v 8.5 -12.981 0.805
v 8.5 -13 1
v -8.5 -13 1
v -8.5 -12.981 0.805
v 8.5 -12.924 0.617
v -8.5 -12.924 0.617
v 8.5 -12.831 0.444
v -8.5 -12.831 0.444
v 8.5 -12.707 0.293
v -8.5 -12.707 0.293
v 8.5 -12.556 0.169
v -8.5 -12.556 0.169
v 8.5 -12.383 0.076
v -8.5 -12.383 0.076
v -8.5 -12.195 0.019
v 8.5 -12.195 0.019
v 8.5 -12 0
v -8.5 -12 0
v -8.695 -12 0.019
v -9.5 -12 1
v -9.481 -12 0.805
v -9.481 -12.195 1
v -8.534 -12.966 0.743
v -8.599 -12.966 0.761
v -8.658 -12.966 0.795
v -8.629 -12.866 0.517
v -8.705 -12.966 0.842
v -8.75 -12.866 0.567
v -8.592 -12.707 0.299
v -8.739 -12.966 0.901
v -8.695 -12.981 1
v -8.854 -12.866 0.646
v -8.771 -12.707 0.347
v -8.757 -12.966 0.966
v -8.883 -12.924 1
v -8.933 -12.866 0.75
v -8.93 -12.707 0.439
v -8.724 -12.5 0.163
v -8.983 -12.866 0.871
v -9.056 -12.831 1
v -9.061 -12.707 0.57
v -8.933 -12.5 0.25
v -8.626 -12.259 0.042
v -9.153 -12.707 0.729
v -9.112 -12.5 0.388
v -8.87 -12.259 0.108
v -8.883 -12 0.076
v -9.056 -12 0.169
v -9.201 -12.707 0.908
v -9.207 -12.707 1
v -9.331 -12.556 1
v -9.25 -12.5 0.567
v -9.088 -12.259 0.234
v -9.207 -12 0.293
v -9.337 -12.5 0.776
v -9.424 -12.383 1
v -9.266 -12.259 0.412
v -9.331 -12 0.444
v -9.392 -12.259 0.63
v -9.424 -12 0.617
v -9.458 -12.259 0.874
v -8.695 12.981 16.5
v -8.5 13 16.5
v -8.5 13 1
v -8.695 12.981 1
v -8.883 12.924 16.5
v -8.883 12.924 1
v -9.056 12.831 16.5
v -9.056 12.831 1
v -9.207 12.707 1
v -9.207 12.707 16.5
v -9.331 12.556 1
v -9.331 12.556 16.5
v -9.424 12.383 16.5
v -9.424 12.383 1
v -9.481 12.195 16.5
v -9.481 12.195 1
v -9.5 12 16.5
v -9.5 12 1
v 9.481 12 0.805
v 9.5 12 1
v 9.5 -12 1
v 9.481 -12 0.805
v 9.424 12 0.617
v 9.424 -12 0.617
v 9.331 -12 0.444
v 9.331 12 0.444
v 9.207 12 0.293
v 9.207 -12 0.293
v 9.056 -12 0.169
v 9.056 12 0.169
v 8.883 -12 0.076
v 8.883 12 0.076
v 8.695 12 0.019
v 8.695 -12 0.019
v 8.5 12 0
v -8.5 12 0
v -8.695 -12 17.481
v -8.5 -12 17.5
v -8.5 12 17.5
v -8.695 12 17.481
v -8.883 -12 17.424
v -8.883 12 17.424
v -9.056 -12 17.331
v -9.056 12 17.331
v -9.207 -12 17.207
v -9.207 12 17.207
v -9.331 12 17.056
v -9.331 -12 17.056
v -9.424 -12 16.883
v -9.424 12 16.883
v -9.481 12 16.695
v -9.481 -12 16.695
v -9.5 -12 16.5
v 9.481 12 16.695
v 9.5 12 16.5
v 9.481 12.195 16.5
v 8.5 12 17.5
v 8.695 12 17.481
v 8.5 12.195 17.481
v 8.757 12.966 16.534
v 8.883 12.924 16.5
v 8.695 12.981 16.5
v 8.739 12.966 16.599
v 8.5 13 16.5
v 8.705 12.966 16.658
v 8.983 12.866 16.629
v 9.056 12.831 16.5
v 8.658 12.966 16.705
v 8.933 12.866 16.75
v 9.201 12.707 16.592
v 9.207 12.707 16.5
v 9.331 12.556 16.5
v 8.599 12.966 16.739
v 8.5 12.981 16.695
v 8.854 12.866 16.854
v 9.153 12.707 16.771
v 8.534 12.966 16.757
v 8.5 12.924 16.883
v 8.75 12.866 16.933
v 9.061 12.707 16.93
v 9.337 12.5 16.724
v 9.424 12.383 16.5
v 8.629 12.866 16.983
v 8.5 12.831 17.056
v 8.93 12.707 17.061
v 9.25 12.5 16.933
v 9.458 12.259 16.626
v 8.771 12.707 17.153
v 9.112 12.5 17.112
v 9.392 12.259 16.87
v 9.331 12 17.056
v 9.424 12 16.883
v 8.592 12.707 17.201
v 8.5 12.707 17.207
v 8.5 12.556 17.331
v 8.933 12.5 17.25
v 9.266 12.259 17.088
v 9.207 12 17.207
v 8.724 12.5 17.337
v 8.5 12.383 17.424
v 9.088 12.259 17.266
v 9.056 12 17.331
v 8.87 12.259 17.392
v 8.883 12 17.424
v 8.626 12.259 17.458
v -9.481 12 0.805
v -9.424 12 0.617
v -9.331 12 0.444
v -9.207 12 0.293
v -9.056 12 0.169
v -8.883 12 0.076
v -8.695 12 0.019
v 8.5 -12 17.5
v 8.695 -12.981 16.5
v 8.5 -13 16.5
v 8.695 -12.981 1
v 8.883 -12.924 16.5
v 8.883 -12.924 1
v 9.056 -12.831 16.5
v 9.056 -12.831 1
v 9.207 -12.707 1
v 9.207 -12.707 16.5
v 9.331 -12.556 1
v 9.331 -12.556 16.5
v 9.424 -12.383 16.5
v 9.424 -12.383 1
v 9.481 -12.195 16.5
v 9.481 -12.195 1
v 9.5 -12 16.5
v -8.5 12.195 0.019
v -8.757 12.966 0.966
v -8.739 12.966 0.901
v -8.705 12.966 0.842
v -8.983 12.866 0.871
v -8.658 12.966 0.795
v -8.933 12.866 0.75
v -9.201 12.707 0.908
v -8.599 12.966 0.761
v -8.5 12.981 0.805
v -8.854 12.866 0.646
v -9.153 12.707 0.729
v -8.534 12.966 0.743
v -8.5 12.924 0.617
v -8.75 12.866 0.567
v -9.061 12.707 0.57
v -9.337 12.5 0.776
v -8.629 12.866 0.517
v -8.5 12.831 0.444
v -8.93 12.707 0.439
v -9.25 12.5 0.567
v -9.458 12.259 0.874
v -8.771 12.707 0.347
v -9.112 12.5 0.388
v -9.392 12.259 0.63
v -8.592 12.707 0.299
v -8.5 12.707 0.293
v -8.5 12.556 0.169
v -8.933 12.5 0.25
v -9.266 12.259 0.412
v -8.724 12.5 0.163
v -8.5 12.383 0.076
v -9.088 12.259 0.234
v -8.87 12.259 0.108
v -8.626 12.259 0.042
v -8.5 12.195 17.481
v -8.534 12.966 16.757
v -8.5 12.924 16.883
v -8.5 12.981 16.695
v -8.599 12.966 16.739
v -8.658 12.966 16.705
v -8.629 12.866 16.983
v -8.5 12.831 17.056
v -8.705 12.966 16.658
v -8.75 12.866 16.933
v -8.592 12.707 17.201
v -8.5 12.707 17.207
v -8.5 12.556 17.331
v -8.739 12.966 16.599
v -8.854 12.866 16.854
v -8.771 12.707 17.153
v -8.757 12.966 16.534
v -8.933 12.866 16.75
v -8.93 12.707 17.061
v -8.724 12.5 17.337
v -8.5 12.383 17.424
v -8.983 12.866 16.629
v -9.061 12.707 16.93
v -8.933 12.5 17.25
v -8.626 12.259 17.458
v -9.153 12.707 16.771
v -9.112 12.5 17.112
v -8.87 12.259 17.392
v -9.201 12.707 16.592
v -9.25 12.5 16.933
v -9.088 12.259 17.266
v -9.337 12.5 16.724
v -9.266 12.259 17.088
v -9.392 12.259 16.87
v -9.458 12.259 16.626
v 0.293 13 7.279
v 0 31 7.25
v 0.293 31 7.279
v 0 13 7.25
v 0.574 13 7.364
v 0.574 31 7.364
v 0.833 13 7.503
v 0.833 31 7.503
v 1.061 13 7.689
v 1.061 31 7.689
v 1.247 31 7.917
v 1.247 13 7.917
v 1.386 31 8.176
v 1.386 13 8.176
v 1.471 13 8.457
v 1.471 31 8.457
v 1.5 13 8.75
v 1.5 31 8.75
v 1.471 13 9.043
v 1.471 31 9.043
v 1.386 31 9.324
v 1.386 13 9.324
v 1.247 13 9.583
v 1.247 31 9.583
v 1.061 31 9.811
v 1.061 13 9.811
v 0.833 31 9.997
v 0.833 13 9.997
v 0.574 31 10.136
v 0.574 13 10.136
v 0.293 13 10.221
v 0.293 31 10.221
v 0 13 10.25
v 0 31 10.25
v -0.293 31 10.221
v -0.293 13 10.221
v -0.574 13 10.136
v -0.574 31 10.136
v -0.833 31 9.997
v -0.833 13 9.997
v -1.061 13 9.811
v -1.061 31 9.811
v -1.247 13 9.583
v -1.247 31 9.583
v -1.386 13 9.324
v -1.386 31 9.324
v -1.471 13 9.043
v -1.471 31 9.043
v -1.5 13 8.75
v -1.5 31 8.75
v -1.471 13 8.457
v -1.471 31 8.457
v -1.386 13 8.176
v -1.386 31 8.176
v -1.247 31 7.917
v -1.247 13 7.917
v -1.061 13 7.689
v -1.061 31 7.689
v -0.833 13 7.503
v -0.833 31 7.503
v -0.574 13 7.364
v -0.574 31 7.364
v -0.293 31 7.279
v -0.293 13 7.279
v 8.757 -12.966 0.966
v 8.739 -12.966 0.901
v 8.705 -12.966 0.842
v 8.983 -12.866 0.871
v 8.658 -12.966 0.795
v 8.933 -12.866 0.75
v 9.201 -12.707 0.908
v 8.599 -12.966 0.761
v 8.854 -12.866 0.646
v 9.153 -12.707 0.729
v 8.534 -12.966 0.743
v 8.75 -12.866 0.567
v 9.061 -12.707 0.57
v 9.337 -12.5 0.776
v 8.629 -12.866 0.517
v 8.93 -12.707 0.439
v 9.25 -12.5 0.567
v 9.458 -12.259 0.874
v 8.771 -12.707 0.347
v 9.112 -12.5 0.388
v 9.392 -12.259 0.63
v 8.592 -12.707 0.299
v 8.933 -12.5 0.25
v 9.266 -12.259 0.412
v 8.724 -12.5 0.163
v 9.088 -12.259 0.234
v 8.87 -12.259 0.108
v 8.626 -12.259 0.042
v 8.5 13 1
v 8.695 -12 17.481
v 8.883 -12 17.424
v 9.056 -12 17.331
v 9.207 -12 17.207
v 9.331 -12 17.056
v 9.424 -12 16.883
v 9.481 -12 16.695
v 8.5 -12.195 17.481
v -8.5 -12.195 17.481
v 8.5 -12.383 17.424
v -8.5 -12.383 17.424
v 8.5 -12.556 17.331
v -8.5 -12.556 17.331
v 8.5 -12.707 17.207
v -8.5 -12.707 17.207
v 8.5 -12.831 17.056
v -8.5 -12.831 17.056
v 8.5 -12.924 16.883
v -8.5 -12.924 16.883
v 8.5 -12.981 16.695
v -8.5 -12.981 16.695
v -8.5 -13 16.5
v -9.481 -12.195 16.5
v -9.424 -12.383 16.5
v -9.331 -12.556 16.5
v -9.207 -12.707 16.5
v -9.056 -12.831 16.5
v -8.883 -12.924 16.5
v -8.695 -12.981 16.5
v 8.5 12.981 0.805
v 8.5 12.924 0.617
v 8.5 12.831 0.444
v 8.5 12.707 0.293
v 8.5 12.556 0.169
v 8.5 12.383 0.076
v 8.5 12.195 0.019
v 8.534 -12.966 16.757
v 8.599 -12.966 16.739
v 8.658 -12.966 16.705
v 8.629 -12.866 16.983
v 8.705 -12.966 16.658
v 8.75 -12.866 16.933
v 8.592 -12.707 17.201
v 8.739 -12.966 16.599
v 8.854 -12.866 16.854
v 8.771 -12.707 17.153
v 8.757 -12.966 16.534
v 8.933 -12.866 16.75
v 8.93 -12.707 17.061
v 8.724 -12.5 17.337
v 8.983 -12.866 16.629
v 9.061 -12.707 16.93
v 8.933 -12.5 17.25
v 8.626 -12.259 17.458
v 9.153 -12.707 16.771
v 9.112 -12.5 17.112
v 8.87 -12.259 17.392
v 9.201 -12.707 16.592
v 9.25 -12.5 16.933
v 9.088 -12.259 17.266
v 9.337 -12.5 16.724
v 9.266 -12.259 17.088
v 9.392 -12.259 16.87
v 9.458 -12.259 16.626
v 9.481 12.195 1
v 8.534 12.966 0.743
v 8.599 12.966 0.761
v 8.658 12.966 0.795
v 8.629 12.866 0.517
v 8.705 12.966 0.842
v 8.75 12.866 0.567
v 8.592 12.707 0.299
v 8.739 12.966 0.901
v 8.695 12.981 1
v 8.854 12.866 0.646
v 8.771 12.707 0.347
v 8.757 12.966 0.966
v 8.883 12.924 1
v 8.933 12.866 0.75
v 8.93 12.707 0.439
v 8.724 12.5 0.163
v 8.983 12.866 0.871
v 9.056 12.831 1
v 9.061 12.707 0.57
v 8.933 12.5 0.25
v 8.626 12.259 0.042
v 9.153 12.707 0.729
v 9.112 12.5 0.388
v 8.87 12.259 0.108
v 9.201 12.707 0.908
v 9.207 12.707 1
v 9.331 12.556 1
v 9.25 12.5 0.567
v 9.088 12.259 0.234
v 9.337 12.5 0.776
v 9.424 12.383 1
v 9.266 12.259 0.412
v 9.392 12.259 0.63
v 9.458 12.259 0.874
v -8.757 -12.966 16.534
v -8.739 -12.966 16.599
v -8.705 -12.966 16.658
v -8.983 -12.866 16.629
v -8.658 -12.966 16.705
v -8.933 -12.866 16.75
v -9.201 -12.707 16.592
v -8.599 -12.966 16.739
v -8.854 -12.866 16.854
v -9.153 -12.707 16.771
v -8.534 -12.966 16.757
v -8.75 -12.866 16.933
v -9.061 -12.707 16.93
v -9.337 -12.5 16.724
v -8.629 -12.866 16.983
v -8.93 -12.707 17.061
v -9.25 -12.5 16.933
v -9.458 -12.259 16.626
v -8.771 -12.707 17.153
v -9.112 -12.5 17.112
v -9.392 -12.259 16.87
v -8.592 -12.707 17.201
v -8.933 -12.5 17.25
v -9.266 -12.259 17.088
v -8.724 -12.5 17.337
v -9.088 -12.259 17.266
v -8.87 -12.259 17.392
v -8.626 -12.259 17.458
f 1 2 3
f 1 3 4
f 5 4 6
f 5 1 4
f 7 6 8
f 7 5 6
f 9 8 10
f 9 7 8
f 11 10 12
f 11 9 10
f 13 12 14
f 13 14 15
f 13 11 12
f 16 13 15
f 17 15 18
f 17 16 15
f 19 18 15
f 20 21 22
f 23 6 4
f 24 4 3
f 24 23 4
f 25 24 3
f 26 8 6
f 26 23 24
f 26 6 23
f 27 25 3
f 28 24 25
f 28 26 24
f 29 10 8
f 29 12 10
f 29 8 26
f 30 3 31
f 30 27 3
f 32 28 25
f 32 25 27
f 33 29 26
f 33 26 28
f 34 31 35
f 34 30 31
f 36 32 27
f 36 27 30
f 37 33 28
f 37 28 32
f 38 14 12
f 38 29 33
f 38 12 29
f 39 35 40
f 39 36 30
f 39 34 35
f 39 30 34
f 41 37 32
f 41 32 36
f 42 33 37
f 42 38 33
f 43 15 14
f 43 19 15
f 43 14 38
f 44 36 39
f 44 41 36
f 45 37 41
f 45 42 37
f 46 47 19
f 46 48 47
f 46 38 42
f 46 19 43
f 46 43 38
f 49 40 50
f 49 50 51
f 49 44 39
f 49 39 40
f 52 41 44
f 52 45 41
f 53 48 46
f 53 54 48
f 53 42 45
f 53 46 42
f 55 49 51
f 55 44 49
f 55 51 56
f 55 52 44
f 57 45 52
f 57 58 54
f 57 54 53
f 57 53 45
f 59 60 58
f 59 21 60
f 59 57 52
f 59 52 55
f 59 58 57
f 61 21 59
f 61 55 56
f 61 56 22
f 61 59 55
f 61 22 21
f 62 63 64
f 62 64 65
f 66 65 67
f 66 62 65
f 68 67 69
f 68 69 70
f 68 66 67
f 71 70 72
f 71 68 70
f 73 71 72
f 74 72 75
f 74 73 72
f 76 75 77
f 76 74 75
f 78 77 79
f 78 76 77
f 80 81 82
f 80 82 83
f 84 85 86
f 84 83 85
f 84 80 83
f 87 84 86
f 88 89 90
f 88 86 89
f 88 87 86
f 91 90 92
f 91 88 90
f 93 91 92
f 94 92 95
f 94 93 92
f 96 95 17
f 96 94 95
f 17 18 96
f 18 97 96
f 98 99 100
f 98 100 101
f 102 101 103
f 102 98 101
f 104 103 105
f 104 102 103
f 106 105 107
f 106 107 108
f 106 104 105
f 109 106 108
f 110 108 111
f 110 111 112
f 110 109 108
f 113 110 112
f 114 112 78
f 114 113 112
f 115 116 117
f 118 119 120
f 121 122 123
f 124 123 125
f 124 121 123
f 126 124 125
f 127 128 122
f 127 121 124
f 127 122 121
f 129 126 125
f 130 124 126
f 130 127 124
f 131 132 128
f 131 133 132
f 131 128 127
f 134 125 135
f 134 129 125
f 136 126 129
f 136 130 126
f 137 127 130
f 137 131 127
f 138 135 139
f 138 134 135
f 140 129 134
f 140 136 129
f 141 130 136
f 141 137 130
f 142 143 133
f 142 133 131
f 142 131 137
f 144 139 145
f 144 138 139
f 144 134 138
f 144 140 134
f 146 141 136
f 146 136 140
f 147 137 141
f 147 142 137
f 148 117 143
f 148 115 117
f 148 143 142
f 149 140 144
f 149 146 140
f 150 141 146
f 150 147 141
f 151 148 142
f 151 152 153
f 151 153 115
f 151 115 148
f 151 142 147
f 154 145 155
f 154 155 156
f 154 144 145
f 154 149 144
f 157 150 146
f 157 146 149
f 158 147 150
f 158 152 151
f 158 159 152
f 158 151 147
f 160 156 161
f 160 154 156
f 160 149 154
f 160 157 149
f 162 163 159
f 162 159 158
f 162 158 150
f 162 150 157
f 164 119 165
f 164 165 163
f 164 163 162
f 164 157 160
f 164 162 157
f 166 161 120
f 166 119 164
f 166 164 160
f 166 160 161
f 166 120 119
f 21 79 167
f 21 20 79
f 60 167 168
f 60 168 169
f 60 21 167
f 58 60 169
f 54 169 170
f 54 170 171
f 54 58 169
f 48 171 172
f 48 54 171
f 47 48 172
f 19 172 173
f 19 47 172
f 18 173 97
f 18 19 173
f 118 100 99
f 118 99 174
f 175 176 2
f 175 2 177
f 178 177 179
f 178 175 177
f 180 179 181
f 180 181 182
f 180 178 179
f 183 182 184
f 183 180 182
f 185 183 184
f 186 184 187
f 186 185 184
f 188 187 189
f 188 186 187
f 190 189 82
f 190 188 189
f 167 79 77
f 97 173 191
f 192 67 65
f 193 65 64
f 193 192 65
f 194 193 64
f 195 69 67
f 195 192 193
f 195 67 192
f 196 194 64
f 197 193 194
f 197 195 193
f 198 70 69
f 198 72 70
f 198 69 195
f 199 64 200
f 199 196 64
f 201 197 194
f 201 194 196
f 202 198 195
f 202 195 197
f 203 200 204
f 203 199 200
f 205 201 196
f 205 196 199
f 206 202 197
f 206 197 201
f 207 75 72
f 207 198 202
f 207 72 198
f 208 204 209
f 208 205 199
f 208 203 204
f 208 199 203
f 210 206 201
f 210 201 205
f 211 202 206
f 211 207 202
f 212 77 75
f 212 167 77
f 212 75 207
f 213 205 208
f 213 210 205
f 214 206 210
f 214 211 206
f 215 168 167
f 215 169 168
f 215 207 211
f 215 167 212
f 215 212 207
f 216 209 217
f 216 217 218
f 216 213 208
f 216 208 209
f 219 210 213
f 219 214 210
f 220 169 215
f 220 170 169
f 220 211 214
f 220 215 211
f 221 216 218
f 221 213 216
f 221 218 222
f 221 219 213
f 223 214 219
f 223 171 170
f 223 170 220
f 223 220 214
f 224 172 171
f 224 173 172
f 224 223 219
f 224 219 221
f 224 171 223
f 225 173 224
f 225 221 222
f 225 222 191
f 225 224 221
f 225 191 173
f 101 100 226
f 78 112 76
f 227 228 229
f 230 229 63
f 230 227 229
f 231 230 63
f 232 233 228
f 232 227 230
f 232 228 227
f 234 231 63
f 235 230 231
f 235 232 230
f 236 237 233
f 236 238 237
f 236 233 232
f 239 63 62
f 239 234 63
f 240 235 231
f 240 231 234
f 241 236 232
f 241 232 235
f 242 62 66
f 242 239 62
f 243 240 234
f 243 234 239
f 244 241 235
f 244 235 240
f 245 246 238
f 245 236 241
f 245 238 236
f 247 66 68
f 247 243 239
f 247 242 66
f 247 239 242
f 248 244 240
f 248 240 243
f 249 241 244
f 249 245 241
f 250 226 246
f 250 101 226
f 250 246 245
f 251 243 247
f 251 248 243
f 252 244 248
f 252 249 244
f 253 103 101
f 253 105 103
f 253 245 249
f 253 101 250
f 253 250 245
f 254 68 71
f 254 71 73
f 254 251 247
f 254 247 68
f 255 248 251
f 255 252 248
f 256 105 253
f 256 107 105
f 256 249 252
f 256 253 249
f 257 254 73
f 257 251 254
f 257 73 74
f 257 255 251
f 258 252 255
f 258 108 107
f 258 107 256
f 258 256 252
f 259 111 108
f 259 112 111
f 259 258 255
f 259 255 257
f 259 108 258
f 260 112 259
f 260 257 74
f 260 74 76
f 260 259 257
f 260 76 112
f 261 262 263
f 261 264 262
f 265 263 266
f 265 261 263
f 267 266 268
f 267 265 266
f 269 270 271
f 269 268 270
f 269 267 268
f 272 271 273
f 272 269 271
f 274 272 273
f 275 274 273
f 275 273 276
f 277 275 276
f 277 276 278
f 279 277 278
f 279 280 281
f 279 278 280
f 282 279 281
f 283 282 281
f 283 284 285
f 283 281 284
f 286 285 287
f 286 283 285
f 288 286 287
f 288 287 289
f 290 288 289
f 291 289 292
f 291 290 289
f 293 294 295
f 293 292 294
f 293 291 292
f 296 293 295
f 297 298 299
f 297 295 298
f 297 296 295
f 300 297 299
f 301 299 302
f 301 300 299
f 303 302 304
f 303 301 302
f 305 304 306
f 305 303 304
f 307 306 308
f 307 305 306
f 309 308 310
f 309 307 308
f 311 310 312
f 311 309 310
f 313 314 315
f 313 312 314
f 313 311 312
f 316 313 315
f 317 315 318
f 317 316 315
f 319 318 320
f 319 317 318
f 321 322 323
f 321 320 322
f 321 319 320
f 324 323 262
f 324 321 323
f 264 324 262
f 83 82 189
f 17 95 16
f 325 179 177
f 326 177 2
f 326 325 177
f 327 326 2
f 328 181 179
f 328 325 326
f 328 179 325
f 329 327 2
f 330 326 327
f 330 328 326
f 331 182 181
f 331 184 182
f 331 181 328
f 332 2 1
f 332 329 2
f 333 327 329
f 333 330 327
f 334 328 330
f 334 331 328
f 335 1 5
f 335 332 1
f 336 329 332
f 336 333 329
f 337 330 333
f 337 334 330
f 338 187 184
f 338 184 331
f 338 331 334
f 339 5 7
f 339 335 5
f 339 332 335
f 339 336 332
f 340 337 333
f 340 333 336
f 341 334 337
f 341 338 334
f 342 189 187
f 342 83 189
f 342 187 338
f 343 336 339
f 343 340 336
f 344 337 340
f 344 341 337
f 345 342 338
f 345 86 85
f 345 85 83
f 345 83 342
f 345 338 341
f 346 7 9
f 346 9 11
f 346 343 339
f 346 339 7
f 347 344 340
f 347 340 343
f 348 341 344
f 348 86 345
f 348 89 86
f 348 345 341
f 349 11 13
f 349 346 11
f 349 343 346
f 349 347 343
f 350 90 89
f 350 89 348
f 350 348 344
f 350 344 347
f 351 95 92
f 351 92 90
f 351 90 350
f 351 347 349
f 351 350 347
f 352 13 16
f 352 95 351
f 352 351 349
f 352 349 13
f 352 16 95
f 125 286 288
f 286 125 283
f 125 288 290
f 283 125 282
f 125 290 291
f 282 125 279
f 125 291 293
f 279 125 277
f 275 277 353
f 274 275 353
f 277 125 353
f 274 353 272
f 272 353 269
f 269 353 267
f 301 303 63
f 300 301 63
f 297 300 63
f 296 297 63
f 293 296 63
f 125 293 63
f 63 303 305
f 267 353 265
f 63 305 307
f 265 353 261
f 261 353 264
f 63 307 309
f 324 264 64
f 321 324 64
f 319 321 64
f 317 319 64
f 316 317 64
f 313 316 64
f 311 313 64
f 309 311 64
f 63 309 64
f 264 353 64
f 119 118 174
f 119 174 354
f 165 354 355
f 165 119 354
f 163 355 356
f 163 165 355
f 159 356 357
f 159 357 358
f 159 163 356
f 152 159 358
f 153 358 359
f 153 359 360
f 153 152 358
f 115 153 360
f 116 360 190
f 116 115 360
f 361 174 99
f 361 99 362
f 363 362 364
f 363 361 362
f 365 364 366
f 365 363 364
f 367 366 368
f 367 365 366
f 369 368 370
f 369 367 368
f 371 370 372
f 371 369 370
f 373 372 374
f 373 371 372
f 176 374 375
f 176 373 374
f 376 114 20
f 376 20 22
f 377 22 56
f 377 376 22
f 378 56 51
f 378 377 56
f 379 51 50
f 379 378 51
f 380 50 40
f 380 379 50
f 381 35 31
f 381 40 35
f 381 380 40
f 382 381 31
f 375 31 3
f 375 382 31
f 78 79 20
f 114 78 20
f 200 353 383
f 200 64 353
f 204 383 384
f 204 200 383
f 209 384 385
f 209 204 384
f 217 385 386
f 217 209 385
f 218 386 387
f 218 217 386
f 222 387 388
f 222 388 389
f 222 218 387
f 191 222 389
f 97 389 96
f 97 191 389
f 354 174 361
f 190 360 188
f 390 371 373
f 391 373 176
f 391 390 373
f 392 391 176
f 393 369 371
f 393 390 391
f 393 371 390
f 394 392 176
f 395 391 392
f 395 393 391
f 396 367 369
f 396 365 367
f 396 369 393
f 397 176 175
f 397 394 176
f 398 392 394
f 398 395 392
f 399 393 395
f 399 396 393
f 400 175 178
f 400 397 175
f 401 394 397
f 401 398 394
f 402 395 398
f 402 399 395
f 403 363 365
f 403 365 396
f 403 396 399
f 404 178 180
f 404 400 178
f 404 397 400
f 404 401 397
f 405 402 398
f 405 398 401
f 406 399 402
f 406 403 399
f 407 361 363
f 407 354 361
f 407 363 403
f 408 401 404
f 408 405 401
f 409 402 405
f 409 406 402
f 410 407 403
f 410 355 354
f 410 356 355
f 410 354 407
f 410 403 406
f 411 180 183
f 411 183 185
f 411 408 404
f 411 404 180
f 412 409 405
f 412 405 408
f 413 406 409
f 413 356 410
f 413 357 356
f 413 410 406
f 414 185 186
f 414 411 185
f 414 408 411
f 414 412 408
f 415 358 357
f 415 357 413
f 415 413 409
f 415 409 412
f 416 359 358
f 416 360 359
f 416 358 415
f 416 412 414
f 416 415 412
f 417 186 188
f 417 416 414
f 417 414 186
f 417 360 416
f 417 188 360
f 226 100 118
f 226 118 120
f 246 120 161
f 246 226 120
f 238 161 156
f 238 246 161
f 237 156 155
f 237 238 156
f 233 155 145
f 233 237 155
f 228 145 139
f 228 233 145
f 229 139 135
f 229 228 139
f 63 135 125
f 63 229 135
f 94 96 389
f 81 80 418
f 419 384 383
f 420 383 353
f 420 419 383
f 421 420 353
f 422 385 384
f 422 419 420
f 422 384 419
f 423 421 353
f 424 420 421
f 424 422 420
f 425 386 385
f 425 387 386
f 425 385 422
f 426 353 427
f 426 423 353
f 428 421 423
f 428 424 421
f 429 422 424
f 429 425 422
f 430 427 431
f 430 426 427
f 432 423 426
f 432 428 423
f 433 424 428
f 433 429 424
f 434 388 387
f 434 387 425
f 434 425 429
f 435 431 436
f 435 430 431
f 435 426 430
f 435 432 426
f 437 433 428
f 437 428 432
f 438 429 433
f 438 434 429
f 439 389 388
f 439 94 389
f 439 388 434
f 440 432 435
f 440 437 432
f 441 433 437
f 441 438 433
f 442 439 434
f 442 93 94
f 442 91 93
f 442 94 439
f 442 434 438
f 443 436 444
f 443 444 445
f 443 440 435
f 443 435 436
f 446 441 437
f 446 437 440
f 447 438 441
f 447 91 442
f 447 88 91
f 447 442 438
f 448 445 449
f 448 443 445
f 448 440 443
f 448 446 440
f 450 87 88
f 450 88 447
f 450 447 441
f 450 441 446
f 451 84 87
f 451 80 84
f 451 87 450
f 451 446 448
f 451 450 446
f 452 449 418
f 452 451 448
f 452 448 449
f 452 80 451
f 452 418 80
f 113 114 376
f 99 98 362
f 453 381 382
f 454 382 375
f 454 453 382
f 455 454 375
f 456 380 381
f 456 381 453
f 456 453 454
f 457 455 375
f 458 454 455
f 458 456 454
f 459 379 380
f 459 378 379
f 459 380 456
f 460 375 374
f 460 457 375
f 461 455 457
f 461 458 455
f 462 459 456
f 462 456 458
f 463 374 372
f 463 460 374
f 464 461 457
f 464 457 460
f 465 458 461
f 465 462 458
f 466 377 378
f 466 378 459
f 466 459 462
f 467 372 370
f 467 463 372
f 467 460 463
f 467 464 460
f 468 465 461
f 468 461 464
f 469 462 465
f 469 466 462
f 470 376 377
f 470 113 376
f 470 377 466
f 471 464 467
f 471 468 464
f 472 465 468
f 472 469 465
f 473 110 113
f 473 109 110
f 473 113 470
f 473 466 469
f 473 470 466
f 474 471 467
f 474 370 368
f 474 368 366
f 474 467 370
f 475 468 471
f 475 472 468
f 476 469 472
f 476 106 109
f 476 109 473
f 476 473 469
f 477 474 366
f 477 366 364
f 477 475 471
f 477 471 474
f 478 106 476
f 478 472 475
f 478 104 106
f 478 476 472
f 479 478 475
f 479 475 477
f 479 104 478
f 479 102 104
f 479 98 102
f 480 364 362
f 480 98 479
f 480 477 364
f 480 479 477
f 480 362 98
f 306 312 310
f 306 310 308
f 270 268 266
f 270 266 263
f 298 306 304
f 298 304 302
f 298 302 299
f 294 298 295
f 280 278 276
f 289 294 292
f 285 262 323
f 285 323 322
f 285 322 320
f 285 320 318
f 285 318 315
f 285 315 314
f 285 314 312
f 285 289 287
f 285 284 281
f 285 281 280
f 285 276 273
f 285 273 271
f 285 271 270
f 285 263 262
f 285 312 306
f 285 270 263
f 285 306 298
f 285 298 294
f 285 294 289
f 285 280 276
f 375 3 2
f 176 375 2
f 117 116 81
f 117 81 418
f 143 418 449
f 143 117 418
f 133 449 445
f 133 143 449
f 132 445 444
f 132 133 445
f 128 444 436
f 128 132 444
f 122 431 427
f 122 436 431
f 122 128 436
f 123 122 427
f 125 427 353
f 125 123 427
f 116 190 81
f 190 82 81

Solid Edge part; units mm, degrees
sketch "Sketch1" plane through (0, 0, 0) normal (0, 0, 1) x (1, 0, 0)
  line L0 (-9.5, -13) -> (9.5, -13)
  line L1 (9.5, -13) -> (9.5, 13)
  line L2 (9.5, 13) -> (-9.5, 13)
  line L3 (-9.5, 13) -> (-9.5, -13)
  dimension "D1" = 19
  dimension "D2" = 26
extrude "Ajout_matière_1" add sketch "Sketch1" along normal blind 17.5
fillet "Congé_1" radius 1 12 edges at (9.5, 0, 17.5) (-9.5, 0, 17.5) (-9.5, 0, 0) (9.5, 0, 0) (0, -13, 0) (-9.5, -13, 8.75) (0, -13, 17.5) (9.5, -13, 8.75) (0, 13, 17.5) (-9.5, 13, 8.75) (0, 13, 0) (9.5, 13, 8.75)
sketch "Sketch2" plane through (0, 13, 8.75) normal (0, 1, 0) x (0, 0, -1)
  circle A0 centre (0, 0) radius 1.5
  dimension "D1" = 3
extrude "Ajout_matière_2" add sketch "Sketch2" along normal blind 18
cosmetic_thread "Thread1" size "M3"
properties material "Acier S235"
